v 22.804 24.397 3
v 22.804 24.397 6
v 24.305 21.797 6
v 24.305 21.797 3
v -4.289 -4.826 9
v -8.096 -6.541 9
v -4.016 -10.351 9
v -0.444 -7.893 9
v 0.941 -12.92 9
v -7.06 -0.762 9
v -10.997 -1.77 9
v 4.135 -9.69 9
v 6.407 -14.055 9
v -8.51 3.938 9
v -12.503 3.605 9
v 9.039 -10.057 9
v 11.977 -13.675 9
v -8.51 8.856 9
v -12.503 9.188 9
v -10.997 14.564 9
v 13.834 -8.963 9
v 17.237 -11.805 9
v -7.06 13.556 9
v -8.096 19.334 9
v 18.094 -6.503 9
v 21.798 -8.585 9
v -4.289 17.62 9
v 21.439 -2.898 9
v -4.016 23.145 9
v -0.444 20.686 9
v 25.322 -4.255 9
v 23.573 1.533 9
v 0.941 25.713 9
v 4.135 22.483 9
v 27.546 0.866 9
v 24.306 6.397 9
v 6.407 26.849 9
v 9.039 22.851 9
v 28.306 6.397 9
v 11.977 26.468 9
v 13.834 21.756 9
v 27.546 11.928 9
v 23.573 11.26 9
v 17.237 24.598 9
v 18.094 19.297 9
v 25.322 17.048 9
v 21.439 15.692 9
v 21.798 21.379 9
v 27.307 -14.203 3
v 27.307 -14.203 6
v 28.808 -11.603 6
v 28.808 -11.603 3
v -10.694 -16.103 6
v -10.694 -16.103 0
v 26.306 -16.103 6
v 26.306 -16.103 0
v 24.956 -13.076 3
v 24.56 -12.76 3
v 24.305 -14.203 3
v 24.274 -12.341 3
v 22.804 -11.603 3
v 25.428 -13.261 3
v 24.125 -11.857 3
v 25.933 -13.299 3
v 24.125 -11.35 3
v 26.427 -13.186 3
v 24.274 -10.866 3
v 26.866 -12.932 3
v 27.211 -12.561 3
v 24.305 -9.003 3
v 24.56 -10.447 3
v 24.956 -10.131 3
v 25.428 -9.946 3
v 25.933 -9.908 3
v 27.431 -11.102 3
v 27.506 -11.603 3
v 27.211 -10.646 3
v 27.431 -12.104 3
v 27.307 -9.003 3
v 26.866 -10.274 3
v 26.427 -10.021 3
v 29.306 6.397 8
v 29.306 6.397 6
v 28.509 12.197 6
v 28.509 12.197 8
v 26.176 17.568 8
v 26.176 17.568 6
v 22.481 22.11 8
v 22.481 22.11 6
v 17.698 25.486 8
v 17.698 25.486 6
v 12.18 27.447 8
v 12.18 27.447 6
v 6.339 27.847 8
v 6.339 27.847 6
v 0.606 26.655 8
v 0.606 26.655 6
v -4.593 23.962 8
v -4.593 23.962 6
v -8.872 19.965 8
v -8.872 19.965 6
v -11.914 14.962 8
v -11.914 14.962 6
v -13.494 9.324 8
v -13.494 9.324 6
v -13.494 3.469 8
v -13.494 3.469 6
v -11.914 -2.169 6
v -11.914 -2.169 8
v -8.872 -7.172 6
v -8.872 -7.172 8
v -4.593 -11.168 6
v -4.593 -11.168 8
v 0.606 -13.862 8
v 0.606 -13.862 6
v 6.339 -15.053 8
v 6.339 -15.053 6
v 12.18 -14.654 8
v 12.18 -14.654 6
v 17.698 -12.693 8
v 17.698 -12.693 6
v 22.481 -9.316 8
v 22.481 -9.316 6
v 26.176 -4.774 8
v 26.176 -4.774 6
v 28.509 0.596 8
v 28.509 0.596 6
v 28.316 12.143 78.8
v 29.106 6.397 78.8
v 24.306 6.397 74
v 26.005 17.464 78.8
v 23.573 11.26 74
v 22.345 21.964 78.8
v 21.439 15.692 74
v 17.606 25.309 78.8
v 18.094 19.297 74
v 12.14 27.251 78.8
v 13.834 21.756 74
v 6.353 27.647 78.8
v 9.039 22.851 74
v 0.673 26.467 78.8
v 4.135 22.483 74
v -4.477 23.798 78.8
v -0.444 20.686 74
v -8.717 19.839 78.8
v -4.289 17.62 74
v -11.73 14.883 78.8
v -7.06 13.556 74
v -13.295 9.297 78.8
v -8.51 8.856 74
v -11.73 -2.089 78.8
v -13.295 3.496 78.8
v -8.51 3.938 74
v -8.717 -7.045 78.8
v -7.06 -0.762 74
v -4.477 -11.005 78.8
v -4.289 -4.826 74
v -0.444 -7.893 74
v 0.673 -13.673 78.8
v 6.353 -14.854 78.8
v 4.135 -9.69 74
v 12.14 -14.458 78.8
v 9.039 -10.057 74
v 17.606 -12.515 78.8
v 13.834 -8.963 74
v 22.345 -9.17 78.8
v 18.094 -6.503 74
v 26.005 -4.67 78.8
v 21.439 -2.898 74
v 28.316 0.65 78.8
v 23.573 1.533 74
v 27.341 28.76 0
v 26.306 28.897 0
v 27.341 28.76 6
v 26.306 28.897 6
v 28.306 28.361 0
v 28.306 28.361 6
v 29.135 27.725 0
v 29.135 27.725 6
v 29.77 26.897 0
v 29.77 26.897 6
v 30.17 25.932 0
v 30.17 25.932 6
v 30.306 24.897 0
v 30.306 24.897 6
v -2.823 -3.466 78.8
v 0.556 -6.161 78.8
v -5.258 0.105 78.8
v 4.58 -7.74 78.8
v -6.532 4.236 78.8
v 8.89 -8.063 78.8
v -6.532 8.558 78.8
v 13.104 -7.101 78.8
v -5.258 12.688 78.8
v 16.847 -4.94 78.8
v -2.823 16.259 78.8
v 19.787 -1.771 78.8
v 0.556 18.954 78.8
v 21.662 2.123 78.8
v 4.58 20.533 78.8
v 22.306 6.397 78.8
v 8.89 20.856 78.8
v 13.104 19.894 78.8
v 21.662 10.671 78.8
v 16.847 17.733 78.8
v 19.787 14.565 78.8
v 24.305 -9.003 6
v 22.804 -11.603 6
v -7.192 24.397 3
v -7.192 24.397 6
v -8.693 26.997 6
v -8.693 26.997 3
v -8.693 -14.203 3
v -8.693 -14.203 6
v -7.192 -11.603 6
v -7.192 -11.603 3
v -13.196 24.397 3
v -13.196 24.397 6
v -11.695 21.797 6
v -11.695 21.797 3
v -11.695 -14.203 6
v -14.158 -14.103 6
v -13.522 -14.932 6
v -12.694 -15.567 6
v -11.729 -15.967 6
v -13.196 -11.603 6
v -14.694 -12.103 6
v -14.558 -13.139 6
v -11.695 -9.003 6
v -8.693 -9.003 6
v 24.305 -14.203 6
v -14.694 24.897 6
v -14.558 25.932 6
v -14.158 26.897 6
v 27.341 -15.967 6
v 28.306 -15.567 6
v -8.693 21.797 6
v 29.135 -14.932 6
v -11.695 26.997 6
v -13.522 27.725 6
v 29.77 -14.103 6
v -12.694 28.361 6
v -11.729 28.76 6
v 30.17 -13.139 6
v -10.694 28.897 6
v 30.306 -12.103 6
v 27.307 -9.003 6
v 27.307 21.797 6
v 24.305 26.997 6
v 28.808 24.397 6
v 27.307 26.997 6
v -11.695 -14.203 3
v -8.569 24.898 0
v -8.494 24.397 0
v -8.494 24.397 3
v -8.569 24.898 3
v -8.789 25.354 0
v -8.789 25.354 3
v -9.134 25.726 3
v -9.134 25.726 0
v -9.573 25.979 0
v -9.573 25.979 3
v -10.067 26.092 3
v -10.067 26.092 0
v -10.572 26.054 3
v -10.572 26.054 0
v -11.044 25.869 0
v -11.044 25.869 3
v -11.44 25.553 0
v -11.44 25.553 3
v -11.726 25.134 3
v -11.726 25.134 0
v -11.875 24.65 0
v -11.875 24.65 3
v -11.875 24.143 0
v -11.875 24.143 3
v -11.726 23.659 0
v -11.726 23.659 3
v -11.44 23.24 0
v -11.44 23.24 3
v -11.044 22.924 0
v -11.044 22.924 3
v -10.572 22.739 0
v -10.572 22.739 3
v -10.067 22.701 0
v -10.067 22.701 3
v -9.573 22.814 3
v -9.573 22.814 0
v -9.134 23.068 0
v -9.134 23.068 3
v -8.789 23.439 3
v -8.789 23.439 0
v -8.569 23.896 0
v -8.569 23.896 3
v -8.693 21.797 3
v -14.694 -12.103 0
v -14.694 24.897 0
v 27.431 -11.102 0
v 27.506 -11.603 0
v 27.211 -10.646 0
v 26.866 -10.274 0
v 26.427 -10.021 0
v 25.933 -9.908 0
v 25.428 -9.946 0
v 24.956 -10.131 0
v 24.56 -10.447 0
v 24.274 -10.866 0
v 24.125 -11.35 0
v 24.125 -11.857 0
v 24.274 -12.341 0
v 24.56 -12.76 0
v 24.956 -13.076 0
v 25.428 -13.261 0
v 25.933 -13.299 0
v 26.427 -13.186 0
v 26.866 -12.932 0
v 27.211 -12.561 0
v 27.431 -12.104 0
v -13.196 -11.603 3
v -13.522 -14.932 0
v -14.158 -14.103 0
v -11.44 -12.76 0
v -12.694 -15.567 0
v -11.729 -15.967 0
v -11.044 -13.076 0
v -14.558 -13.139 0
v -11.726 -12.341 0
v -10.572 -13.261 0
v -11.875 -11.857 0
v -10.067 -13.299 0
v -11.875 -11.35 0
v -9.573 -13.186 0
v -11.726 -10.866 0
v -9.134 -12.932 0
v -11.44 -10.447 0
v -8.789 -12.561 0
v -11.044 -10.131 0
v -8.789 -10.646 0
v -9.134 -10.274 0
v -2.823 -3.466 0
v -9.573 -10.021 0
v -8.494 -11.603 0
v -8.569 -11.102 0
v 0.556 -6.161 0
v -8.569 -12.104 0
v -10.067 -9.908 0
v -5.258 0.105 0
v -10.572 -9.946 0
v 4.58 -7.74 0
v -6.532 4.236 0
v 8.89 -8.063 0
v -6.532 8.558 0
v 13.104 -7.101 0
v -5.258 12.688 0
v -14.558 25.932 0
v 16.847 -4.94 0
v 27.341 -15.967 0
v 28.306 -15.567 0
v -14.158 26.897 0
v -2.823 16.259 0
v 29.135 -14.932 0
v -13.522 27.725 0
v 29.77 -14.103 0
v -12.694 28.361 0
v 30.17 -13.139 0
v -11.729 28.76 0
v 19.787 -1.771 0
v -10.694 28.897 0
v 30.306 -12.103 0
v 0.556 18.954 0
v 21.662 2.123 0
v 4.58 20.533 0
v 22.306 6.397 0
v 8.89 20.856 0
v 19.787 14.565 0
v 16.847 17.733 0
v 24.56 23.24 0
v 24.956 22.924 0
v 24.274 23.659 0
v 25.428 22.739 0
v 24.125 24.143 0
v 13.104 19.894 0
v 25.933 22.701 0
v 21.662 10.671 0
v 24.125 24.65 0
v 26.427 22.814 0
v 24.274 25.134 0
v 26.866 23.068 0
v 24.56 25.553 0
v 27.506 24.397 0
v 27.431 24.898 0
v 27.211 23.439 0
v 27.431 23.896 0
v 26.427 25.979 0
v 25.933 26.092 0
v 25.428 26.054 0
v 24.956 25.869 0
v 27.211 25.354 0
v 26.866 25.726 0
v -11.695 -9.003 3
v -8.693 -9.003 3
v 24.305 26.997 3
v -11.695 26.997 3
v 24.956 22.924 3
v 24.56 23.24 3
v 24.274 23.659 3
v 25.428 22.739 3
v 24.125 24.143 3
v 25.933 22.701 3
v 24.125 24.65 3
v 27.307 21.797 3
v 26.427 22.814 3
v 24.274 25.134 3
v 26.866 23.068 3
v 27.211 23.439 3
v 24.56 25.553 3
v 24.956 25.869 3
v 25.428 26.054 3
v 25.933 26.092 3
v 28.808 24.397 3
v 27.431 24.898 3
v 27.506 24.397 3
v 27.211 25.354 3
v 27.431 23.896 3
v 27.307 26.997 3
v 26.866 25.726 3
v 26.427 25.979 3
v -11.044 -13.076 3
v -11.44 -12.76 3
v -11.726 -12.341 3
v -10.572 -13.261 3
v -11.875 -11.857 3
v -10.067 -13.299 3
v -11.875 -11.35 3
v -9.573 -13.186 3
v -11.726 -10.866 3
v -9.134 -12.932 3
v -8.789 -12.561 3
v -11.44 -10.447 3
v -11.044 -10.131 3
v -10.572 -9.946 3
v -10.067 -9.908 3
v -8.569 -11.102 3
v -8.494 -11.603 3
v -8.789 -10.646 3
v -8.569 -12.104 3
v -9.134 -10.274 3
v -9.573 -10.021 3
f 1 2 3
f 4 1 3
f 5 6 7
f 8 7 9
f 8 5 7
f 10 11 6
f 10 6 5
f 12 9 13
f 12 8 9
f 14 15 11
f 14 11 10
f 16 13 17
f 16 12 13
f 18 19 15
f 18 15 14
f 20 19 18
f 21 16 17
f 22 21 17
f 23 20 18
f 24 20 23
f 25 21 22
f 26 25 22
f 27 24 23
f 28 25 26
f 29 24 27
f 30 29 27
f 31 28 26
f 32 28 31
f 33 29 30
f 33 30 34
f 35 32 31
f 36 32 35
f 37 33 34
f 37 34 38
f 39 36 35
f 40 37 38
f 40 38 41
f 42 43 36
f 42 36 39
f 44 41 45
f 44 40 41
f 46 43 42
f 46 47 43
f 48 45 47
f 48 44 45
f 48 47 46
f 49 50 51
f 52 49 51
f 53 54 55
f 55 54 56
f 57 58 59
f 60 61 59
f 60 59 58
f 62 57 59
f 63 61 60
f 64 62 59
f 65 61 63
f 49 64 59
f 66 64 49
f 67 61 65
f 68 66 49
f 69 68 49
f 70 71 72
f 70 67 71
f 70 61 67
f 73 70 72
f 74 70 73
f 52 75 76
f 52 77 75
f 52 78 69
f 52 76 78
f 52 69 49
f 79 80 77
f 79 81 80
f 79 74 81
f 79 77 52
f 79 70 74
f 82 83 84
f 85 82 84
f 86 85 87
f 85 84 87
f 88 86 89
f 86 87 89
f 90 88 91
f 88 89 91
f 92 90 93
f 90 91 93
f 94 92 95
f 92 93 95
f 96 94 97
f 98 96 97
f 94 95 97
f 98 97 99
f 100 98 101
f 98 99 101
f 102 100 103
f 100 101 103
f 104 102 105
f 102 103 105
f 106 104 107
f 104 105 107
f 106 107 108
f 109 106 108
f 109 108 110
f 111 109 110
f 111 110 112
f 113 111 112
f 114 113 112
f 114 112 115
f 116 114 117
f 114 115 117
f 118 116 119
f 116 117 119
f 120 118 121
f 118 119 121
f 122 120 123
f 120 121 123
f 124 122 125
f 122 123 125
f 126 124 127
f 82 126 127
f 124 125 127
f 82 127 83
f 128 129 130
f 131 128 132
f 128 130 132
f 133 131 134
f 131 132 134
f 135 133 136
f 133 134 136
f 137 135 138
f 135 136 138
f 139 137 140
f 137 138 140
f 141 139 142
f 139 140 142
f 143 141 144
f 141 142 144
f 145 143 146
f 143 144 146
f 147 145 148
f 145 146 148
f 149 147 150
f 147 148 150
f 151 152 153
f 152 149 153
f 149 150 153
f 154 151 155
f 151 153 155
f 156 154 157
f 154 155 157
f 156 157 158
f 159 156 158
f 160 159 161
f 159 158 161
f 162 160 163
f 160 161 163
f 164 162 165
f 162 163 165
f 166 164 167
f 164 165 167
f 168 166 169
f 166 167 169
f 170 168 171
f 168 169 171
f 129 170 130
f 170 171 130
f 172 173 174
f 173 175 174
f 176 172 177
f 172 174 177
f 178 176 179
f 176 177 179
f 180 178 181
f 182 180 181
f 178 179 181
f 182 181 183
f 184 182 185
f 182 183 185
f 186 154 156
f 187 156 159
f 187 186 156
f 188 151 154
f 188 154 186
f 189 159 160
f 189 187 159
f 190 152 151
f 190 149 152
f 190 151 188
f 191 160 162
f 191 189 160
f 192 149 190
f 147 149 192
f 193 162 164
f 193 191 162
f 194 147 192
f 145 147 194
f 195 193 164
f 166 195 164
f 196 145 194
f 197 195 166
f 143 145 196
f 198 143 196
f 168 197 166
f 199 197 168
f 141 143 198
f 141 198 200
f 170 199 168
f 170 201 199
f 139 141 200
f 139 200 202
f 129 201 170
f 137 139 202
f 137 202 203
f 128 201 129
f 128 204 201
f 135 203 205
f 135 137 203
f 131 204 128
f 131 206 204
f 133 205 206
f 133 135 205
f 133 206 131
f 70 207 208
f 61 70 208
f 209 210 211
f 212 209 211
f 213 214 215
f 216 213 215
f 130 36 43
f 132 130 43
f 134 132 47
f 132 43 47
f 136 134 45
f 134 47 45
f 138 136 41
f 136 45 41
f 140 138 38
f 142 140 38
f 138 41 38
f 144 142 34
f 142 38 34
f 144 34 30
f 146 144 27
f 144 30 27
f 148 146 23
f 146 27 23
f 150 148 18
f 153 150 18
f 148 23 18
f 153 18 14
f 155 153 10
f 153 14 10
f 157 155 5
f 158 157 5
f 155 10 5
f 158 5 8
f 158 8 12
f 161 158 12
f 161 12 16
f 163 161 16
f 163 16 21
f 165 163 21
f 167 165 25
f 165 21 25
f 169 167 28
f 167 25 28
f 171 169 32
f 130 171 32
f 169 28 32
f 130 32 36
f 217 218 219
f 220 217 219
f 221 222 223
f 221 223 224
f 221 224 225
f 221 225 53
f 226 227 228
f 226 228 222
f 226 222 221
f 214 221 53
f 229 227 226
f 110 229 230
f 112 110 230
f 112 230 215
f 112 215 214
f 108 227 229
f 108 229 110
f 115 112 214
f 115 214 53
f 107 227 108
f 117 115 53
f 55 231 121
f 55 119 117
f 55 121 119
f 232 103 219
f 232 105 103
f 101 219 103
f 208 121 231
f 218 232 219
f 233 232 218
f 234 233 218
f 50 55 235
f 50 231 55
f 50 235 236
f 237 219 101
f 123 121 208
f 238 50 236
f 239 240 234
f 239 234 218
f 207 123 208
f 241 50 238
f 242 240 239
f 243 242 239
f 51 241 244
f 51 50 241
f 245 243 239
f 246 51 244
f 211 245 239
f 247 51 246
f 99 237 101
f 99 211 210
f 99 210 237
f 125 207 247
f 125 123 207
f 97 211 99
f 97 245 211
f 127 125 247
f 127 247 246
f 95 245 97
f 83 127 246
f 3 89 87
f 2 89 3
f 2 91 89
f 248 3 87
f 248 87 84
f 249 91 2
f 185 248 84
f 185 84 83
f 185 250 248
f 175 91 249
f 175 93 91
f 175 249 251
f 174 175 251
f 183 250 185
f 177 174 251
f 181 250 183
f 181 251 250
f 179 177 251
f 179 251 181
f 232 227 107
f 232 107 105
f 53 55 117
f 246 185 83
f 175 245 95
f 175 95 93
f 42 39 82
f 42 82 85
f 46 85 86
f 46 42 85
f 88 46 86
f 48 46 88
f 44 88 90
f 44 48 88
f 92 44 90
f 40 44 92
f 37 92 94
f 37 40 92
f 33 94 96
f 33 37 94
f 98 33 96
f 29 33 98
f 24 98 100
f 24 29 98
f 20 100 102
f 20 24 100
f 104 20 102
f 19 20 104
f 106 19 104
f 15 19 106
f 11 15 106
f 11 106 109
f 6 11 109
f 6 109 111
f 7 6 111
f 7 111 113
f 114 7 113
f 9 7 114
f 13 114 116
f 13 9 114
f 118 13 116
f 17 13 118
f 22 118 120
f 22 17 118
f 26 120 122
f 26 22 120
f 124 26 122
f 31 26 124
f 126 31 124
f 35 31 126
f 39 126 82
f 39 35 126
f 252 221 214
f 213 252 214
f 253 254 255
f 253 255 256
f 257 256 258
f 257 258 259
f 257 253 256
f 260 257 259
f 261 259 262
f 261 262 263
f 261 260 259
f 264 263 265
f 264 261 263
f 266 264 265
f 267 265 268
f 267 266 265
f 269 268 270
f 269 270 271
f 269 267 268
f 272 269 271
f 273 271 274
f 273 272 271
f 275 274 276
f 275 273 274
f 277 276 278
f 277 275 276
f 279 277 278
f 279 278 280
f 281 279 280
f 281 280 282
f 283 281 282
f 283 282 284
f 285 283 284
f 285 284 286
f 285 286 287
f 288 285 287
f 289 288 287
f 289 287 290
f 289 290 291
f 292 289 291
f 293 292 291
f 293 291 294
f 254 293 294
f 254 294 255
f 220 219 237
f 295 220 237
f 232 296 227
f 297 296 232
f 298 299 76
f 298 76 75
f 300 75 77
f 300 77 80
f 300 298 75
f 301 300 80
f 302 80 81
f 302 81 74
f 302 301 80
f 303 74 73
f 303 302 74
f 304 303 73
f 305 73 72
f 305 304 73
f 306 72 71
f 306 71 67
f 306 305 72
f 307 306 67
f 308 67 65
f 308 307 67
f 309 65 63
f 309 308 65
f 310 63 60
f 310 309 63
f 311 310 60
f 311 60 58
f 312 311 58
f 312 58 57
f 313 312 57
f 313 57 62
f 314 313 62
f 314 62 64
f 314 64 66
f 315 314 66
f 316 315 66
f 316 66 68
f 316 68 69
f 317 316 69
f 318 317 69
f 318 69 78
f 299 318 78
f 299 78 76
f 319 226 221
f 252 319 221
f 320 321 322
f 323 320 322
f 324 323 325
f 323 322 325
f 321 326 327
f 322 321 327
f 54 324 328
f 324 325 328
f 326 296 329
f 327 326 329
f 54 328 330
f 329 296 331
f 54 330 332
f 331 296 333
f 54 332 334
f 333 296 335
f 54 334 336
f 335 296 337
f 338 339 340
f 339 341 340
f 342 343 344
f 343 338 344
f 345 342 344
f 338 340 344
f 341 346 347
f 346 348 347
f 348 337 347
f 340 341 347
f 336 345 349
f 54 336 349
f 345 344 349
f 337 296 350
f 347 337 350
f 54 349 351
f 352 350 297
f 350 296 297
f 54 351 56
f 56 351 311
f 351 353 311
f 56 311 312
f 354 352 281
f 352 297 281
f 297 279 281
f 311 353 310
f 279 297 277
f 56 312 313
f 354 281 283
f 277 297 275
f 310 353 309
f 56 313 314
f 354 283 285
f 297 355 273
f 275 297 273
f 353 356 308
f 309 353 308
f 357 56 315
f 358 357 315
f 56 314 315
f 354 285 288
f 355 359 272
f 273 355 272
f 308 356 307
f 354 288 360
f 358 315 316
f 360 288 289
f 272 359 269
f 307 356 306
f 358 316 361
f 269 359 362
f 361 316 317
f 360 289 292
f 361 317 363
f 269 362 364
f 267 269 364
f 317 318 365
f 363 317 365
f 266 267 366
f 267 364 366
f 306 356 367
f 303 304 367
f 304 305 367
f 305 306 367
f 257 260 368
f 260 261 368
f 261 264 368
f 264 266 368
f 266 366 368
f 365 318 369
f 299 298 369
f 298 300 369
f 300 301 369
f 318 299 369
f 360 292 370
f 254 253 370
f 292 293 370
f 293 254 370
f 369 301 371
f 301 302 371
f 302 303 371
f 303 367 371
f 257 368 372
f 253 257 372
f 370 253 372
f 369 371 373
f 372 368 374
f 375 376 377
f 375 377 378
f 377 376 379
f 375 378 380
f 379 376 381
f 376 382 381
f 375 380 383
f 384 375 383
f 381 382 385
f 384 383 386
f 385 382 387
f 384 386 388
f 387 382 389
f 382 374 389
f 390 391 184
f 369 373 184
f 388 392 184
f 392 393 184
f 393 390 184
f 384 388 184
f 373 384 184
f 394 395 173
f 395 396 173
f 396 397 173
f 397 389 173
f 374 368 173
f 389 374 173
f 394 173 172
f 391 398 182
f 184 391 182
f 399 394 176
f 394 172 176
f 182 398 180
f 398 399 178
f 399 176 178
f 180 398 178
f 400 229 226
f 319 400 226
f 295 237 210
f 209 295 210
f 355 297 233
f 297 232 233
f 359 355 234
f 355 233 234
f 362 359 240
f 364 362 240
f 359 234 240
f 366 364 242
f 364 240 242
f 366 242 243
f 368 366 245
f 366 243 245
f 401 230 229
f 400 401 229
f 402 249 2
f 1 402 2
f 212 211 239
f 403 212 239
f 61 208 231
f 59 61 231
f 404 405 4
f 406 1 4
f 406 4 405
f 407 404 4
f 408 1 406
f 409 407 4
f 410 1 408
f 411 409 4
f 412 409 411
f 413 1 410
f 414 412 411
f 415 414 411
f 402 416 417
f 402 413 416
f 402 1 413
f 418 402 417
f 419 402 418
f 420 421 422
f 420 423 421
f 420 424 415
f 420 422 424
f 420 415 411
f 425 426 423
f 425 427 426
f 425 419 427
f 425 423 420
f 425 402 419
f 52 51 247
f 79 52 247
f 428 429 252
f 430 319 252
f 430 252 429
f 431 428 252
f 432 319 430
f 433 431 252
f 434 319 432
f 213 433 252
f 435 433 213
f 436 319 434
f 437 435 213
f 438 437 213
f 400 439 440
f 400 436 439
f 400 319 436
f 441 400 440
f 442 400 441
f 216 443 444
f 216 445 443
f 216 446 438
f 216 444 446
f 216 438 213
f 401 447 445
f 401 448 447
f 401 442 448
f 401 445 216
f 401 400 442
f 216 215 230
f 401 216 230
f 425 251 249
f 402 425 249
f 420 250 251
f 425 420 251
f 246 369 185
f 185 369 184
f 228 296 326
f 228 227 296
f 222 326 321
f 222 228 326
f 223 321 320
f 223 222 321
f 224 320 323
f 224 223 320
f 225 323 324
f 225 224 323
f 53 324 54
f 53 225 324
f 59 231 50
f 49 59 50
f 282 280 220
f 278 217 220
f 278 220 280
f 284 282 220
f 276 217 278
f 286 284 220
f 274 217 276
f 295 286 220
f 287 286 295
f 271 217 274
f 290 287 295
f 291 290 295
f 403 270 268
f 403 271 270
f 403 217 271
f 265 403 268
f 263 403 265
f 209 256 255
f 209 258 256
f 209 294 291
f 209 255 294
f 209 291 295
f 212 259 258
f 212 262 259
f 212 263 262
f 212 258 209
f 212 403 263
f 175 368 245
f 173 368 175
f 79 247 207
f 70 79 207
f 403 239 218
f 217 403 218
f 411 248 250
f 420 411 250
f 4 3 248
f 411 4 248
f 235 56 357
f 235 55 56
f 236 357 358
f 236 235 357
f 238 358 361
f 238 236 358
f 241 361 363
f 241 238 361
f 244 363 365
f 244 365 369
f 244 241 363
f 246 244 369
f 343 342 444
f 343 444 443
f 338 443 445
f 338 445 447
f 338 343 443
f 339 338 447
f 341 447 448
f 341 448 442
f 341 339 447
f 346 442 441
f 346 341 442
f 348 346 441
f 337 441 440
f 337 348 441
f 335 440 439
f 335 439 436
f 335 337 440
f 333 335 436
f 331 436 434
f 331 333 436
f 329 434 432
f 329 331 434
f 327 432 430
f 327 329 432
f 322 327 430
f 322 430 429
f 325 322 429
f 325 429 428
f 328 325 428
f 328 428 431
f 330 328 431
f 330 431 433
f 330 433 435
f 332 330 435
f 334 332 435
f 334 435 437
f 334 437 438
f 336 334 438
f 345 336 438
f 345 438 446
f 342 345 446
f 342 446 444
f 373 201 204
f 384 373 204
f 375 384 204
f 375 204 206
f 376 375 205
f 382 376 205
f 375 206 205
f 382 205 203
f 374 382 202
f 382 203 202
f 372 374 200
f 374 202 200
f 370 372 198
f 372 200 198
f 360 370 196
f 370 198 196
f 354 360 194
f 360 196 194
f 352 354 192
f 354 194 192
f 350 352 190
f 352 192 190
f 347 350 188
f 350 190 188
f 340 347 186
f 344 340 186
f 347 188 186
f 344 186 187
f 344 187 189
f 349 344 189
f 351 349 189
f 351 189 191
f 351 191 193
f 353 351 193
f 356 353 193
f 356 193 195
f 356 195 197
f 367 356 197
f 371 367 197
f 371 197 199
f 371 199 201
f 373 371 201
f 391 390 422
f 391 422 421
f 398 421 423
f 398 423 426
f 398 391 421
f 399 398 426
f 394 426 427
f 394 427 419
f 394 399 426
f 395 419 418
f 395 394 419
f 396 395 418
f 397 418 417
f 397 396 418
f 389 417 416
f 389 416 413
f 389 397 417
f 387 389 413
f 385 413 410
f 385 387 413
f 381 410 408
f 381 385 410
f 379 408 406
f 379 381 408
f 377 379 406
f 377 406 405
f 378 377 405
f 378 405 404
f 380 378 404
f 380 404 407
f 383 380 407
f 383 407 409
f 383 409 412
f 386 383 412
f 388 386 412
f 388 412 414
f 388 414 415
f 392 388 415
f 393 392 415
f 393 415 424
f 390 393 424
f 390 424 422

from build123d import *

# Parameters (mm, degrees)
F0_W         = 45
F0_H         = 45
F0_R         = 1.7
F1_DEPTH     = 6
F2_R         = 1.7
F3_DEPTH     = 3
F4_R         = 4
F5_R         = 21.5
F6_DEPTH     = 3
F7_SIZE      = 1
F8_R         = 16.5
F9_DEPTH     = 65
F10_R        = 21.5
F11_DEPTH    = 4.8
F12_S5_R     = 16.5
F12_T6_DEPTH = 32
F13_R        = 14.5
F14_DEPTH    = 100


# Not quite as in the source:
# - a fillet or chamfer that OpenCascade refuses, or shapes differently, is made with other operations: its cross-section is extruded or revolved along the edge and cut away or added


with BuildPart() as f1:
    # F0 (on Top) → F1 (new body)
    with BuildSketch(Plane.XY):
        with Locations((7.8061202839, 6.3967237547)):
            Rectangle(F0_W, F0_H)
        with Locations((-10.1938797161, -11.6032762453)):
            Circle(F0_R, mode=Mode.SUBTRACT)
        with Locations((25.8061202839, -11.6032762453)):
            Circle(F0_R, mode=Mode.SUBTRACT)
        with Locations((-10.1938797161, 24.3967237547)):
            Circle(F0_R, mode=Mode.SUBTRACT)
        with Locations((25.8061202839, 24.3967237547)):
            Circle(F0_R, mode=Mode.SUBTRACT)
    extrude(amount=F1_DEPTH)

    # F2 (on face) → F3 (cut)
    with BuildSketch(Plane.XY.offset(6)):
        Polygon((-11.694990416, 21.7967237547), (-8.6927690162, 21.7967237547), (-7.1916583163, 24.3967237547), (-8.6927690162, 26.9967237547), (-11.694990416, 26.9967237547), (-13.1961011159, 24.3967237547), align=None)
        with Locations((-10.1938797161, 24.3967237547)):
            Circle(F2_R, mode=Mode.SUBTRACT)
        Polygon((24.305009584, 21.7967237547), (27.3072309838, 21.7967237547), (28.8083416837, 24.3967237547), (27.3072309838, 26.9967237547), (24.305009584, 26.9967237547), (22.8038988841, 24.3967237547), align=None)
        with Locations((25.8061202839, 24.3967237547)):
            Circle(F2_R, mode=Mode.SUBTRACT)
        Polygon((-8.6927690162, -9.0032762453), (-11.694990416, -9.0032762453), (-13.1961011159, -11.6032762453), (-11.694990416, -14.2032762453), (-8.6927690162, -14.2032762453), (-7.1916583163, -11.6032762453), align=None)
        with Locations((-10.1938797161, -11.6032762453)):
            Circle(F2_R, mode=Mode.SUBTRACT)
        Polygon((27.3072309838, -9.0032762453), (24.305009584, -9.0032762453), (22.8038988841, -11.6032762453), (24.305009584, -14.2032762453), (27.3072309838, -14.2032762453), (28.8083416837, -11.6032762453), align=None)
        with Locations((25.8061202839, -11.6032762453)):
            Circle(F2_R, mode=Mode.SUBTRACT)
    extrude(amount=-F3_DEPTH, mode=Mode.SUBTRACT)

    # F4
    f4_edges = [f1.edges().sort_by_distance(p)[0] for p in [
        (-14.69388, 28.896724, 3),
        (30.30612, 28.896724, 3),
        (30.30612, -16.103276, 3),
        (-14.69388, -16.103276, 3),
    ]]
    fillet(f4_edges, radius=F4_R)

    # F5 (on face) → F6 (join)
    with BuildSketch(Plane.XY.offset(6)):
        with Locations((7.8061202839, 6.3967237547)):
            Circle(F5_R)
    extrude(amount=F6_DEPTH)

    # F7
    f7_edges = [f1.edges().sort_by_distance(p)[0] for p in [
        (-13.69388, 6.396724, 9),
    ]]
    chamfer(f7_edges, length=F7_SIZE)

    # F8 (on face) → F9 (join)
    with BuildSketch(Plane.XY.offset(9)):
        with Locations((7.8061202839, 6.3967237547)):
            Circle(F8_R)
    extrude(amount=F9_DEPTH)

    # F10 (on face) → F11 (join)
    with BuildSketch(Plane.XY.offset(74)):
        with Locations((7.8061202839, 6.3967237547)):
            Circle(F10_R)
    extrude(amount=F11_DEPTH)

    # F12: chamfer of 5 on 1 edges, made by hand


with BuildPart() as f12_tool2:
    # F12_s3 → F12_t4 (revolve)
    with BuildSketch(Plane.XZ.offset(-6.3967237547)):
        Polygon((29.3061202839, 79), (24.3061202839, 74), (29.3061202839, 74), align=None)
    revolve(axis=Axis((7.8061202839, 6.3967237547, 74), (0, 0, 1)))

    # F12_s5 → F12_t6 (cut, symmetric)
    with BuildSketch(Plane.XY.offset(76.5)):
        with Locations((7.8061202839, 6.3967237547)):
            Circle(F12_S5_R)
    extrude(amount=F12_T6_DEPTH, both=True, mode=Mode.SUBTRACT)


with BuildPart() as f1_1:
    add(f1.part)

    # F12_t1: cut F12_tool2
    add(f12_tool2.part, mode=Mode.SUBTRACT)

    # F13 (on face) → F14 (cut)
    with BuildSketch(Plane.XY.offset(78.8)):
        with Locations((7.8061202839, 6.3967237547)):
            Circle(F13_R)
    extrude(amount=-F14_DEPTH, mode=Mode.SUBTRACT)


solid = f1_1.part
